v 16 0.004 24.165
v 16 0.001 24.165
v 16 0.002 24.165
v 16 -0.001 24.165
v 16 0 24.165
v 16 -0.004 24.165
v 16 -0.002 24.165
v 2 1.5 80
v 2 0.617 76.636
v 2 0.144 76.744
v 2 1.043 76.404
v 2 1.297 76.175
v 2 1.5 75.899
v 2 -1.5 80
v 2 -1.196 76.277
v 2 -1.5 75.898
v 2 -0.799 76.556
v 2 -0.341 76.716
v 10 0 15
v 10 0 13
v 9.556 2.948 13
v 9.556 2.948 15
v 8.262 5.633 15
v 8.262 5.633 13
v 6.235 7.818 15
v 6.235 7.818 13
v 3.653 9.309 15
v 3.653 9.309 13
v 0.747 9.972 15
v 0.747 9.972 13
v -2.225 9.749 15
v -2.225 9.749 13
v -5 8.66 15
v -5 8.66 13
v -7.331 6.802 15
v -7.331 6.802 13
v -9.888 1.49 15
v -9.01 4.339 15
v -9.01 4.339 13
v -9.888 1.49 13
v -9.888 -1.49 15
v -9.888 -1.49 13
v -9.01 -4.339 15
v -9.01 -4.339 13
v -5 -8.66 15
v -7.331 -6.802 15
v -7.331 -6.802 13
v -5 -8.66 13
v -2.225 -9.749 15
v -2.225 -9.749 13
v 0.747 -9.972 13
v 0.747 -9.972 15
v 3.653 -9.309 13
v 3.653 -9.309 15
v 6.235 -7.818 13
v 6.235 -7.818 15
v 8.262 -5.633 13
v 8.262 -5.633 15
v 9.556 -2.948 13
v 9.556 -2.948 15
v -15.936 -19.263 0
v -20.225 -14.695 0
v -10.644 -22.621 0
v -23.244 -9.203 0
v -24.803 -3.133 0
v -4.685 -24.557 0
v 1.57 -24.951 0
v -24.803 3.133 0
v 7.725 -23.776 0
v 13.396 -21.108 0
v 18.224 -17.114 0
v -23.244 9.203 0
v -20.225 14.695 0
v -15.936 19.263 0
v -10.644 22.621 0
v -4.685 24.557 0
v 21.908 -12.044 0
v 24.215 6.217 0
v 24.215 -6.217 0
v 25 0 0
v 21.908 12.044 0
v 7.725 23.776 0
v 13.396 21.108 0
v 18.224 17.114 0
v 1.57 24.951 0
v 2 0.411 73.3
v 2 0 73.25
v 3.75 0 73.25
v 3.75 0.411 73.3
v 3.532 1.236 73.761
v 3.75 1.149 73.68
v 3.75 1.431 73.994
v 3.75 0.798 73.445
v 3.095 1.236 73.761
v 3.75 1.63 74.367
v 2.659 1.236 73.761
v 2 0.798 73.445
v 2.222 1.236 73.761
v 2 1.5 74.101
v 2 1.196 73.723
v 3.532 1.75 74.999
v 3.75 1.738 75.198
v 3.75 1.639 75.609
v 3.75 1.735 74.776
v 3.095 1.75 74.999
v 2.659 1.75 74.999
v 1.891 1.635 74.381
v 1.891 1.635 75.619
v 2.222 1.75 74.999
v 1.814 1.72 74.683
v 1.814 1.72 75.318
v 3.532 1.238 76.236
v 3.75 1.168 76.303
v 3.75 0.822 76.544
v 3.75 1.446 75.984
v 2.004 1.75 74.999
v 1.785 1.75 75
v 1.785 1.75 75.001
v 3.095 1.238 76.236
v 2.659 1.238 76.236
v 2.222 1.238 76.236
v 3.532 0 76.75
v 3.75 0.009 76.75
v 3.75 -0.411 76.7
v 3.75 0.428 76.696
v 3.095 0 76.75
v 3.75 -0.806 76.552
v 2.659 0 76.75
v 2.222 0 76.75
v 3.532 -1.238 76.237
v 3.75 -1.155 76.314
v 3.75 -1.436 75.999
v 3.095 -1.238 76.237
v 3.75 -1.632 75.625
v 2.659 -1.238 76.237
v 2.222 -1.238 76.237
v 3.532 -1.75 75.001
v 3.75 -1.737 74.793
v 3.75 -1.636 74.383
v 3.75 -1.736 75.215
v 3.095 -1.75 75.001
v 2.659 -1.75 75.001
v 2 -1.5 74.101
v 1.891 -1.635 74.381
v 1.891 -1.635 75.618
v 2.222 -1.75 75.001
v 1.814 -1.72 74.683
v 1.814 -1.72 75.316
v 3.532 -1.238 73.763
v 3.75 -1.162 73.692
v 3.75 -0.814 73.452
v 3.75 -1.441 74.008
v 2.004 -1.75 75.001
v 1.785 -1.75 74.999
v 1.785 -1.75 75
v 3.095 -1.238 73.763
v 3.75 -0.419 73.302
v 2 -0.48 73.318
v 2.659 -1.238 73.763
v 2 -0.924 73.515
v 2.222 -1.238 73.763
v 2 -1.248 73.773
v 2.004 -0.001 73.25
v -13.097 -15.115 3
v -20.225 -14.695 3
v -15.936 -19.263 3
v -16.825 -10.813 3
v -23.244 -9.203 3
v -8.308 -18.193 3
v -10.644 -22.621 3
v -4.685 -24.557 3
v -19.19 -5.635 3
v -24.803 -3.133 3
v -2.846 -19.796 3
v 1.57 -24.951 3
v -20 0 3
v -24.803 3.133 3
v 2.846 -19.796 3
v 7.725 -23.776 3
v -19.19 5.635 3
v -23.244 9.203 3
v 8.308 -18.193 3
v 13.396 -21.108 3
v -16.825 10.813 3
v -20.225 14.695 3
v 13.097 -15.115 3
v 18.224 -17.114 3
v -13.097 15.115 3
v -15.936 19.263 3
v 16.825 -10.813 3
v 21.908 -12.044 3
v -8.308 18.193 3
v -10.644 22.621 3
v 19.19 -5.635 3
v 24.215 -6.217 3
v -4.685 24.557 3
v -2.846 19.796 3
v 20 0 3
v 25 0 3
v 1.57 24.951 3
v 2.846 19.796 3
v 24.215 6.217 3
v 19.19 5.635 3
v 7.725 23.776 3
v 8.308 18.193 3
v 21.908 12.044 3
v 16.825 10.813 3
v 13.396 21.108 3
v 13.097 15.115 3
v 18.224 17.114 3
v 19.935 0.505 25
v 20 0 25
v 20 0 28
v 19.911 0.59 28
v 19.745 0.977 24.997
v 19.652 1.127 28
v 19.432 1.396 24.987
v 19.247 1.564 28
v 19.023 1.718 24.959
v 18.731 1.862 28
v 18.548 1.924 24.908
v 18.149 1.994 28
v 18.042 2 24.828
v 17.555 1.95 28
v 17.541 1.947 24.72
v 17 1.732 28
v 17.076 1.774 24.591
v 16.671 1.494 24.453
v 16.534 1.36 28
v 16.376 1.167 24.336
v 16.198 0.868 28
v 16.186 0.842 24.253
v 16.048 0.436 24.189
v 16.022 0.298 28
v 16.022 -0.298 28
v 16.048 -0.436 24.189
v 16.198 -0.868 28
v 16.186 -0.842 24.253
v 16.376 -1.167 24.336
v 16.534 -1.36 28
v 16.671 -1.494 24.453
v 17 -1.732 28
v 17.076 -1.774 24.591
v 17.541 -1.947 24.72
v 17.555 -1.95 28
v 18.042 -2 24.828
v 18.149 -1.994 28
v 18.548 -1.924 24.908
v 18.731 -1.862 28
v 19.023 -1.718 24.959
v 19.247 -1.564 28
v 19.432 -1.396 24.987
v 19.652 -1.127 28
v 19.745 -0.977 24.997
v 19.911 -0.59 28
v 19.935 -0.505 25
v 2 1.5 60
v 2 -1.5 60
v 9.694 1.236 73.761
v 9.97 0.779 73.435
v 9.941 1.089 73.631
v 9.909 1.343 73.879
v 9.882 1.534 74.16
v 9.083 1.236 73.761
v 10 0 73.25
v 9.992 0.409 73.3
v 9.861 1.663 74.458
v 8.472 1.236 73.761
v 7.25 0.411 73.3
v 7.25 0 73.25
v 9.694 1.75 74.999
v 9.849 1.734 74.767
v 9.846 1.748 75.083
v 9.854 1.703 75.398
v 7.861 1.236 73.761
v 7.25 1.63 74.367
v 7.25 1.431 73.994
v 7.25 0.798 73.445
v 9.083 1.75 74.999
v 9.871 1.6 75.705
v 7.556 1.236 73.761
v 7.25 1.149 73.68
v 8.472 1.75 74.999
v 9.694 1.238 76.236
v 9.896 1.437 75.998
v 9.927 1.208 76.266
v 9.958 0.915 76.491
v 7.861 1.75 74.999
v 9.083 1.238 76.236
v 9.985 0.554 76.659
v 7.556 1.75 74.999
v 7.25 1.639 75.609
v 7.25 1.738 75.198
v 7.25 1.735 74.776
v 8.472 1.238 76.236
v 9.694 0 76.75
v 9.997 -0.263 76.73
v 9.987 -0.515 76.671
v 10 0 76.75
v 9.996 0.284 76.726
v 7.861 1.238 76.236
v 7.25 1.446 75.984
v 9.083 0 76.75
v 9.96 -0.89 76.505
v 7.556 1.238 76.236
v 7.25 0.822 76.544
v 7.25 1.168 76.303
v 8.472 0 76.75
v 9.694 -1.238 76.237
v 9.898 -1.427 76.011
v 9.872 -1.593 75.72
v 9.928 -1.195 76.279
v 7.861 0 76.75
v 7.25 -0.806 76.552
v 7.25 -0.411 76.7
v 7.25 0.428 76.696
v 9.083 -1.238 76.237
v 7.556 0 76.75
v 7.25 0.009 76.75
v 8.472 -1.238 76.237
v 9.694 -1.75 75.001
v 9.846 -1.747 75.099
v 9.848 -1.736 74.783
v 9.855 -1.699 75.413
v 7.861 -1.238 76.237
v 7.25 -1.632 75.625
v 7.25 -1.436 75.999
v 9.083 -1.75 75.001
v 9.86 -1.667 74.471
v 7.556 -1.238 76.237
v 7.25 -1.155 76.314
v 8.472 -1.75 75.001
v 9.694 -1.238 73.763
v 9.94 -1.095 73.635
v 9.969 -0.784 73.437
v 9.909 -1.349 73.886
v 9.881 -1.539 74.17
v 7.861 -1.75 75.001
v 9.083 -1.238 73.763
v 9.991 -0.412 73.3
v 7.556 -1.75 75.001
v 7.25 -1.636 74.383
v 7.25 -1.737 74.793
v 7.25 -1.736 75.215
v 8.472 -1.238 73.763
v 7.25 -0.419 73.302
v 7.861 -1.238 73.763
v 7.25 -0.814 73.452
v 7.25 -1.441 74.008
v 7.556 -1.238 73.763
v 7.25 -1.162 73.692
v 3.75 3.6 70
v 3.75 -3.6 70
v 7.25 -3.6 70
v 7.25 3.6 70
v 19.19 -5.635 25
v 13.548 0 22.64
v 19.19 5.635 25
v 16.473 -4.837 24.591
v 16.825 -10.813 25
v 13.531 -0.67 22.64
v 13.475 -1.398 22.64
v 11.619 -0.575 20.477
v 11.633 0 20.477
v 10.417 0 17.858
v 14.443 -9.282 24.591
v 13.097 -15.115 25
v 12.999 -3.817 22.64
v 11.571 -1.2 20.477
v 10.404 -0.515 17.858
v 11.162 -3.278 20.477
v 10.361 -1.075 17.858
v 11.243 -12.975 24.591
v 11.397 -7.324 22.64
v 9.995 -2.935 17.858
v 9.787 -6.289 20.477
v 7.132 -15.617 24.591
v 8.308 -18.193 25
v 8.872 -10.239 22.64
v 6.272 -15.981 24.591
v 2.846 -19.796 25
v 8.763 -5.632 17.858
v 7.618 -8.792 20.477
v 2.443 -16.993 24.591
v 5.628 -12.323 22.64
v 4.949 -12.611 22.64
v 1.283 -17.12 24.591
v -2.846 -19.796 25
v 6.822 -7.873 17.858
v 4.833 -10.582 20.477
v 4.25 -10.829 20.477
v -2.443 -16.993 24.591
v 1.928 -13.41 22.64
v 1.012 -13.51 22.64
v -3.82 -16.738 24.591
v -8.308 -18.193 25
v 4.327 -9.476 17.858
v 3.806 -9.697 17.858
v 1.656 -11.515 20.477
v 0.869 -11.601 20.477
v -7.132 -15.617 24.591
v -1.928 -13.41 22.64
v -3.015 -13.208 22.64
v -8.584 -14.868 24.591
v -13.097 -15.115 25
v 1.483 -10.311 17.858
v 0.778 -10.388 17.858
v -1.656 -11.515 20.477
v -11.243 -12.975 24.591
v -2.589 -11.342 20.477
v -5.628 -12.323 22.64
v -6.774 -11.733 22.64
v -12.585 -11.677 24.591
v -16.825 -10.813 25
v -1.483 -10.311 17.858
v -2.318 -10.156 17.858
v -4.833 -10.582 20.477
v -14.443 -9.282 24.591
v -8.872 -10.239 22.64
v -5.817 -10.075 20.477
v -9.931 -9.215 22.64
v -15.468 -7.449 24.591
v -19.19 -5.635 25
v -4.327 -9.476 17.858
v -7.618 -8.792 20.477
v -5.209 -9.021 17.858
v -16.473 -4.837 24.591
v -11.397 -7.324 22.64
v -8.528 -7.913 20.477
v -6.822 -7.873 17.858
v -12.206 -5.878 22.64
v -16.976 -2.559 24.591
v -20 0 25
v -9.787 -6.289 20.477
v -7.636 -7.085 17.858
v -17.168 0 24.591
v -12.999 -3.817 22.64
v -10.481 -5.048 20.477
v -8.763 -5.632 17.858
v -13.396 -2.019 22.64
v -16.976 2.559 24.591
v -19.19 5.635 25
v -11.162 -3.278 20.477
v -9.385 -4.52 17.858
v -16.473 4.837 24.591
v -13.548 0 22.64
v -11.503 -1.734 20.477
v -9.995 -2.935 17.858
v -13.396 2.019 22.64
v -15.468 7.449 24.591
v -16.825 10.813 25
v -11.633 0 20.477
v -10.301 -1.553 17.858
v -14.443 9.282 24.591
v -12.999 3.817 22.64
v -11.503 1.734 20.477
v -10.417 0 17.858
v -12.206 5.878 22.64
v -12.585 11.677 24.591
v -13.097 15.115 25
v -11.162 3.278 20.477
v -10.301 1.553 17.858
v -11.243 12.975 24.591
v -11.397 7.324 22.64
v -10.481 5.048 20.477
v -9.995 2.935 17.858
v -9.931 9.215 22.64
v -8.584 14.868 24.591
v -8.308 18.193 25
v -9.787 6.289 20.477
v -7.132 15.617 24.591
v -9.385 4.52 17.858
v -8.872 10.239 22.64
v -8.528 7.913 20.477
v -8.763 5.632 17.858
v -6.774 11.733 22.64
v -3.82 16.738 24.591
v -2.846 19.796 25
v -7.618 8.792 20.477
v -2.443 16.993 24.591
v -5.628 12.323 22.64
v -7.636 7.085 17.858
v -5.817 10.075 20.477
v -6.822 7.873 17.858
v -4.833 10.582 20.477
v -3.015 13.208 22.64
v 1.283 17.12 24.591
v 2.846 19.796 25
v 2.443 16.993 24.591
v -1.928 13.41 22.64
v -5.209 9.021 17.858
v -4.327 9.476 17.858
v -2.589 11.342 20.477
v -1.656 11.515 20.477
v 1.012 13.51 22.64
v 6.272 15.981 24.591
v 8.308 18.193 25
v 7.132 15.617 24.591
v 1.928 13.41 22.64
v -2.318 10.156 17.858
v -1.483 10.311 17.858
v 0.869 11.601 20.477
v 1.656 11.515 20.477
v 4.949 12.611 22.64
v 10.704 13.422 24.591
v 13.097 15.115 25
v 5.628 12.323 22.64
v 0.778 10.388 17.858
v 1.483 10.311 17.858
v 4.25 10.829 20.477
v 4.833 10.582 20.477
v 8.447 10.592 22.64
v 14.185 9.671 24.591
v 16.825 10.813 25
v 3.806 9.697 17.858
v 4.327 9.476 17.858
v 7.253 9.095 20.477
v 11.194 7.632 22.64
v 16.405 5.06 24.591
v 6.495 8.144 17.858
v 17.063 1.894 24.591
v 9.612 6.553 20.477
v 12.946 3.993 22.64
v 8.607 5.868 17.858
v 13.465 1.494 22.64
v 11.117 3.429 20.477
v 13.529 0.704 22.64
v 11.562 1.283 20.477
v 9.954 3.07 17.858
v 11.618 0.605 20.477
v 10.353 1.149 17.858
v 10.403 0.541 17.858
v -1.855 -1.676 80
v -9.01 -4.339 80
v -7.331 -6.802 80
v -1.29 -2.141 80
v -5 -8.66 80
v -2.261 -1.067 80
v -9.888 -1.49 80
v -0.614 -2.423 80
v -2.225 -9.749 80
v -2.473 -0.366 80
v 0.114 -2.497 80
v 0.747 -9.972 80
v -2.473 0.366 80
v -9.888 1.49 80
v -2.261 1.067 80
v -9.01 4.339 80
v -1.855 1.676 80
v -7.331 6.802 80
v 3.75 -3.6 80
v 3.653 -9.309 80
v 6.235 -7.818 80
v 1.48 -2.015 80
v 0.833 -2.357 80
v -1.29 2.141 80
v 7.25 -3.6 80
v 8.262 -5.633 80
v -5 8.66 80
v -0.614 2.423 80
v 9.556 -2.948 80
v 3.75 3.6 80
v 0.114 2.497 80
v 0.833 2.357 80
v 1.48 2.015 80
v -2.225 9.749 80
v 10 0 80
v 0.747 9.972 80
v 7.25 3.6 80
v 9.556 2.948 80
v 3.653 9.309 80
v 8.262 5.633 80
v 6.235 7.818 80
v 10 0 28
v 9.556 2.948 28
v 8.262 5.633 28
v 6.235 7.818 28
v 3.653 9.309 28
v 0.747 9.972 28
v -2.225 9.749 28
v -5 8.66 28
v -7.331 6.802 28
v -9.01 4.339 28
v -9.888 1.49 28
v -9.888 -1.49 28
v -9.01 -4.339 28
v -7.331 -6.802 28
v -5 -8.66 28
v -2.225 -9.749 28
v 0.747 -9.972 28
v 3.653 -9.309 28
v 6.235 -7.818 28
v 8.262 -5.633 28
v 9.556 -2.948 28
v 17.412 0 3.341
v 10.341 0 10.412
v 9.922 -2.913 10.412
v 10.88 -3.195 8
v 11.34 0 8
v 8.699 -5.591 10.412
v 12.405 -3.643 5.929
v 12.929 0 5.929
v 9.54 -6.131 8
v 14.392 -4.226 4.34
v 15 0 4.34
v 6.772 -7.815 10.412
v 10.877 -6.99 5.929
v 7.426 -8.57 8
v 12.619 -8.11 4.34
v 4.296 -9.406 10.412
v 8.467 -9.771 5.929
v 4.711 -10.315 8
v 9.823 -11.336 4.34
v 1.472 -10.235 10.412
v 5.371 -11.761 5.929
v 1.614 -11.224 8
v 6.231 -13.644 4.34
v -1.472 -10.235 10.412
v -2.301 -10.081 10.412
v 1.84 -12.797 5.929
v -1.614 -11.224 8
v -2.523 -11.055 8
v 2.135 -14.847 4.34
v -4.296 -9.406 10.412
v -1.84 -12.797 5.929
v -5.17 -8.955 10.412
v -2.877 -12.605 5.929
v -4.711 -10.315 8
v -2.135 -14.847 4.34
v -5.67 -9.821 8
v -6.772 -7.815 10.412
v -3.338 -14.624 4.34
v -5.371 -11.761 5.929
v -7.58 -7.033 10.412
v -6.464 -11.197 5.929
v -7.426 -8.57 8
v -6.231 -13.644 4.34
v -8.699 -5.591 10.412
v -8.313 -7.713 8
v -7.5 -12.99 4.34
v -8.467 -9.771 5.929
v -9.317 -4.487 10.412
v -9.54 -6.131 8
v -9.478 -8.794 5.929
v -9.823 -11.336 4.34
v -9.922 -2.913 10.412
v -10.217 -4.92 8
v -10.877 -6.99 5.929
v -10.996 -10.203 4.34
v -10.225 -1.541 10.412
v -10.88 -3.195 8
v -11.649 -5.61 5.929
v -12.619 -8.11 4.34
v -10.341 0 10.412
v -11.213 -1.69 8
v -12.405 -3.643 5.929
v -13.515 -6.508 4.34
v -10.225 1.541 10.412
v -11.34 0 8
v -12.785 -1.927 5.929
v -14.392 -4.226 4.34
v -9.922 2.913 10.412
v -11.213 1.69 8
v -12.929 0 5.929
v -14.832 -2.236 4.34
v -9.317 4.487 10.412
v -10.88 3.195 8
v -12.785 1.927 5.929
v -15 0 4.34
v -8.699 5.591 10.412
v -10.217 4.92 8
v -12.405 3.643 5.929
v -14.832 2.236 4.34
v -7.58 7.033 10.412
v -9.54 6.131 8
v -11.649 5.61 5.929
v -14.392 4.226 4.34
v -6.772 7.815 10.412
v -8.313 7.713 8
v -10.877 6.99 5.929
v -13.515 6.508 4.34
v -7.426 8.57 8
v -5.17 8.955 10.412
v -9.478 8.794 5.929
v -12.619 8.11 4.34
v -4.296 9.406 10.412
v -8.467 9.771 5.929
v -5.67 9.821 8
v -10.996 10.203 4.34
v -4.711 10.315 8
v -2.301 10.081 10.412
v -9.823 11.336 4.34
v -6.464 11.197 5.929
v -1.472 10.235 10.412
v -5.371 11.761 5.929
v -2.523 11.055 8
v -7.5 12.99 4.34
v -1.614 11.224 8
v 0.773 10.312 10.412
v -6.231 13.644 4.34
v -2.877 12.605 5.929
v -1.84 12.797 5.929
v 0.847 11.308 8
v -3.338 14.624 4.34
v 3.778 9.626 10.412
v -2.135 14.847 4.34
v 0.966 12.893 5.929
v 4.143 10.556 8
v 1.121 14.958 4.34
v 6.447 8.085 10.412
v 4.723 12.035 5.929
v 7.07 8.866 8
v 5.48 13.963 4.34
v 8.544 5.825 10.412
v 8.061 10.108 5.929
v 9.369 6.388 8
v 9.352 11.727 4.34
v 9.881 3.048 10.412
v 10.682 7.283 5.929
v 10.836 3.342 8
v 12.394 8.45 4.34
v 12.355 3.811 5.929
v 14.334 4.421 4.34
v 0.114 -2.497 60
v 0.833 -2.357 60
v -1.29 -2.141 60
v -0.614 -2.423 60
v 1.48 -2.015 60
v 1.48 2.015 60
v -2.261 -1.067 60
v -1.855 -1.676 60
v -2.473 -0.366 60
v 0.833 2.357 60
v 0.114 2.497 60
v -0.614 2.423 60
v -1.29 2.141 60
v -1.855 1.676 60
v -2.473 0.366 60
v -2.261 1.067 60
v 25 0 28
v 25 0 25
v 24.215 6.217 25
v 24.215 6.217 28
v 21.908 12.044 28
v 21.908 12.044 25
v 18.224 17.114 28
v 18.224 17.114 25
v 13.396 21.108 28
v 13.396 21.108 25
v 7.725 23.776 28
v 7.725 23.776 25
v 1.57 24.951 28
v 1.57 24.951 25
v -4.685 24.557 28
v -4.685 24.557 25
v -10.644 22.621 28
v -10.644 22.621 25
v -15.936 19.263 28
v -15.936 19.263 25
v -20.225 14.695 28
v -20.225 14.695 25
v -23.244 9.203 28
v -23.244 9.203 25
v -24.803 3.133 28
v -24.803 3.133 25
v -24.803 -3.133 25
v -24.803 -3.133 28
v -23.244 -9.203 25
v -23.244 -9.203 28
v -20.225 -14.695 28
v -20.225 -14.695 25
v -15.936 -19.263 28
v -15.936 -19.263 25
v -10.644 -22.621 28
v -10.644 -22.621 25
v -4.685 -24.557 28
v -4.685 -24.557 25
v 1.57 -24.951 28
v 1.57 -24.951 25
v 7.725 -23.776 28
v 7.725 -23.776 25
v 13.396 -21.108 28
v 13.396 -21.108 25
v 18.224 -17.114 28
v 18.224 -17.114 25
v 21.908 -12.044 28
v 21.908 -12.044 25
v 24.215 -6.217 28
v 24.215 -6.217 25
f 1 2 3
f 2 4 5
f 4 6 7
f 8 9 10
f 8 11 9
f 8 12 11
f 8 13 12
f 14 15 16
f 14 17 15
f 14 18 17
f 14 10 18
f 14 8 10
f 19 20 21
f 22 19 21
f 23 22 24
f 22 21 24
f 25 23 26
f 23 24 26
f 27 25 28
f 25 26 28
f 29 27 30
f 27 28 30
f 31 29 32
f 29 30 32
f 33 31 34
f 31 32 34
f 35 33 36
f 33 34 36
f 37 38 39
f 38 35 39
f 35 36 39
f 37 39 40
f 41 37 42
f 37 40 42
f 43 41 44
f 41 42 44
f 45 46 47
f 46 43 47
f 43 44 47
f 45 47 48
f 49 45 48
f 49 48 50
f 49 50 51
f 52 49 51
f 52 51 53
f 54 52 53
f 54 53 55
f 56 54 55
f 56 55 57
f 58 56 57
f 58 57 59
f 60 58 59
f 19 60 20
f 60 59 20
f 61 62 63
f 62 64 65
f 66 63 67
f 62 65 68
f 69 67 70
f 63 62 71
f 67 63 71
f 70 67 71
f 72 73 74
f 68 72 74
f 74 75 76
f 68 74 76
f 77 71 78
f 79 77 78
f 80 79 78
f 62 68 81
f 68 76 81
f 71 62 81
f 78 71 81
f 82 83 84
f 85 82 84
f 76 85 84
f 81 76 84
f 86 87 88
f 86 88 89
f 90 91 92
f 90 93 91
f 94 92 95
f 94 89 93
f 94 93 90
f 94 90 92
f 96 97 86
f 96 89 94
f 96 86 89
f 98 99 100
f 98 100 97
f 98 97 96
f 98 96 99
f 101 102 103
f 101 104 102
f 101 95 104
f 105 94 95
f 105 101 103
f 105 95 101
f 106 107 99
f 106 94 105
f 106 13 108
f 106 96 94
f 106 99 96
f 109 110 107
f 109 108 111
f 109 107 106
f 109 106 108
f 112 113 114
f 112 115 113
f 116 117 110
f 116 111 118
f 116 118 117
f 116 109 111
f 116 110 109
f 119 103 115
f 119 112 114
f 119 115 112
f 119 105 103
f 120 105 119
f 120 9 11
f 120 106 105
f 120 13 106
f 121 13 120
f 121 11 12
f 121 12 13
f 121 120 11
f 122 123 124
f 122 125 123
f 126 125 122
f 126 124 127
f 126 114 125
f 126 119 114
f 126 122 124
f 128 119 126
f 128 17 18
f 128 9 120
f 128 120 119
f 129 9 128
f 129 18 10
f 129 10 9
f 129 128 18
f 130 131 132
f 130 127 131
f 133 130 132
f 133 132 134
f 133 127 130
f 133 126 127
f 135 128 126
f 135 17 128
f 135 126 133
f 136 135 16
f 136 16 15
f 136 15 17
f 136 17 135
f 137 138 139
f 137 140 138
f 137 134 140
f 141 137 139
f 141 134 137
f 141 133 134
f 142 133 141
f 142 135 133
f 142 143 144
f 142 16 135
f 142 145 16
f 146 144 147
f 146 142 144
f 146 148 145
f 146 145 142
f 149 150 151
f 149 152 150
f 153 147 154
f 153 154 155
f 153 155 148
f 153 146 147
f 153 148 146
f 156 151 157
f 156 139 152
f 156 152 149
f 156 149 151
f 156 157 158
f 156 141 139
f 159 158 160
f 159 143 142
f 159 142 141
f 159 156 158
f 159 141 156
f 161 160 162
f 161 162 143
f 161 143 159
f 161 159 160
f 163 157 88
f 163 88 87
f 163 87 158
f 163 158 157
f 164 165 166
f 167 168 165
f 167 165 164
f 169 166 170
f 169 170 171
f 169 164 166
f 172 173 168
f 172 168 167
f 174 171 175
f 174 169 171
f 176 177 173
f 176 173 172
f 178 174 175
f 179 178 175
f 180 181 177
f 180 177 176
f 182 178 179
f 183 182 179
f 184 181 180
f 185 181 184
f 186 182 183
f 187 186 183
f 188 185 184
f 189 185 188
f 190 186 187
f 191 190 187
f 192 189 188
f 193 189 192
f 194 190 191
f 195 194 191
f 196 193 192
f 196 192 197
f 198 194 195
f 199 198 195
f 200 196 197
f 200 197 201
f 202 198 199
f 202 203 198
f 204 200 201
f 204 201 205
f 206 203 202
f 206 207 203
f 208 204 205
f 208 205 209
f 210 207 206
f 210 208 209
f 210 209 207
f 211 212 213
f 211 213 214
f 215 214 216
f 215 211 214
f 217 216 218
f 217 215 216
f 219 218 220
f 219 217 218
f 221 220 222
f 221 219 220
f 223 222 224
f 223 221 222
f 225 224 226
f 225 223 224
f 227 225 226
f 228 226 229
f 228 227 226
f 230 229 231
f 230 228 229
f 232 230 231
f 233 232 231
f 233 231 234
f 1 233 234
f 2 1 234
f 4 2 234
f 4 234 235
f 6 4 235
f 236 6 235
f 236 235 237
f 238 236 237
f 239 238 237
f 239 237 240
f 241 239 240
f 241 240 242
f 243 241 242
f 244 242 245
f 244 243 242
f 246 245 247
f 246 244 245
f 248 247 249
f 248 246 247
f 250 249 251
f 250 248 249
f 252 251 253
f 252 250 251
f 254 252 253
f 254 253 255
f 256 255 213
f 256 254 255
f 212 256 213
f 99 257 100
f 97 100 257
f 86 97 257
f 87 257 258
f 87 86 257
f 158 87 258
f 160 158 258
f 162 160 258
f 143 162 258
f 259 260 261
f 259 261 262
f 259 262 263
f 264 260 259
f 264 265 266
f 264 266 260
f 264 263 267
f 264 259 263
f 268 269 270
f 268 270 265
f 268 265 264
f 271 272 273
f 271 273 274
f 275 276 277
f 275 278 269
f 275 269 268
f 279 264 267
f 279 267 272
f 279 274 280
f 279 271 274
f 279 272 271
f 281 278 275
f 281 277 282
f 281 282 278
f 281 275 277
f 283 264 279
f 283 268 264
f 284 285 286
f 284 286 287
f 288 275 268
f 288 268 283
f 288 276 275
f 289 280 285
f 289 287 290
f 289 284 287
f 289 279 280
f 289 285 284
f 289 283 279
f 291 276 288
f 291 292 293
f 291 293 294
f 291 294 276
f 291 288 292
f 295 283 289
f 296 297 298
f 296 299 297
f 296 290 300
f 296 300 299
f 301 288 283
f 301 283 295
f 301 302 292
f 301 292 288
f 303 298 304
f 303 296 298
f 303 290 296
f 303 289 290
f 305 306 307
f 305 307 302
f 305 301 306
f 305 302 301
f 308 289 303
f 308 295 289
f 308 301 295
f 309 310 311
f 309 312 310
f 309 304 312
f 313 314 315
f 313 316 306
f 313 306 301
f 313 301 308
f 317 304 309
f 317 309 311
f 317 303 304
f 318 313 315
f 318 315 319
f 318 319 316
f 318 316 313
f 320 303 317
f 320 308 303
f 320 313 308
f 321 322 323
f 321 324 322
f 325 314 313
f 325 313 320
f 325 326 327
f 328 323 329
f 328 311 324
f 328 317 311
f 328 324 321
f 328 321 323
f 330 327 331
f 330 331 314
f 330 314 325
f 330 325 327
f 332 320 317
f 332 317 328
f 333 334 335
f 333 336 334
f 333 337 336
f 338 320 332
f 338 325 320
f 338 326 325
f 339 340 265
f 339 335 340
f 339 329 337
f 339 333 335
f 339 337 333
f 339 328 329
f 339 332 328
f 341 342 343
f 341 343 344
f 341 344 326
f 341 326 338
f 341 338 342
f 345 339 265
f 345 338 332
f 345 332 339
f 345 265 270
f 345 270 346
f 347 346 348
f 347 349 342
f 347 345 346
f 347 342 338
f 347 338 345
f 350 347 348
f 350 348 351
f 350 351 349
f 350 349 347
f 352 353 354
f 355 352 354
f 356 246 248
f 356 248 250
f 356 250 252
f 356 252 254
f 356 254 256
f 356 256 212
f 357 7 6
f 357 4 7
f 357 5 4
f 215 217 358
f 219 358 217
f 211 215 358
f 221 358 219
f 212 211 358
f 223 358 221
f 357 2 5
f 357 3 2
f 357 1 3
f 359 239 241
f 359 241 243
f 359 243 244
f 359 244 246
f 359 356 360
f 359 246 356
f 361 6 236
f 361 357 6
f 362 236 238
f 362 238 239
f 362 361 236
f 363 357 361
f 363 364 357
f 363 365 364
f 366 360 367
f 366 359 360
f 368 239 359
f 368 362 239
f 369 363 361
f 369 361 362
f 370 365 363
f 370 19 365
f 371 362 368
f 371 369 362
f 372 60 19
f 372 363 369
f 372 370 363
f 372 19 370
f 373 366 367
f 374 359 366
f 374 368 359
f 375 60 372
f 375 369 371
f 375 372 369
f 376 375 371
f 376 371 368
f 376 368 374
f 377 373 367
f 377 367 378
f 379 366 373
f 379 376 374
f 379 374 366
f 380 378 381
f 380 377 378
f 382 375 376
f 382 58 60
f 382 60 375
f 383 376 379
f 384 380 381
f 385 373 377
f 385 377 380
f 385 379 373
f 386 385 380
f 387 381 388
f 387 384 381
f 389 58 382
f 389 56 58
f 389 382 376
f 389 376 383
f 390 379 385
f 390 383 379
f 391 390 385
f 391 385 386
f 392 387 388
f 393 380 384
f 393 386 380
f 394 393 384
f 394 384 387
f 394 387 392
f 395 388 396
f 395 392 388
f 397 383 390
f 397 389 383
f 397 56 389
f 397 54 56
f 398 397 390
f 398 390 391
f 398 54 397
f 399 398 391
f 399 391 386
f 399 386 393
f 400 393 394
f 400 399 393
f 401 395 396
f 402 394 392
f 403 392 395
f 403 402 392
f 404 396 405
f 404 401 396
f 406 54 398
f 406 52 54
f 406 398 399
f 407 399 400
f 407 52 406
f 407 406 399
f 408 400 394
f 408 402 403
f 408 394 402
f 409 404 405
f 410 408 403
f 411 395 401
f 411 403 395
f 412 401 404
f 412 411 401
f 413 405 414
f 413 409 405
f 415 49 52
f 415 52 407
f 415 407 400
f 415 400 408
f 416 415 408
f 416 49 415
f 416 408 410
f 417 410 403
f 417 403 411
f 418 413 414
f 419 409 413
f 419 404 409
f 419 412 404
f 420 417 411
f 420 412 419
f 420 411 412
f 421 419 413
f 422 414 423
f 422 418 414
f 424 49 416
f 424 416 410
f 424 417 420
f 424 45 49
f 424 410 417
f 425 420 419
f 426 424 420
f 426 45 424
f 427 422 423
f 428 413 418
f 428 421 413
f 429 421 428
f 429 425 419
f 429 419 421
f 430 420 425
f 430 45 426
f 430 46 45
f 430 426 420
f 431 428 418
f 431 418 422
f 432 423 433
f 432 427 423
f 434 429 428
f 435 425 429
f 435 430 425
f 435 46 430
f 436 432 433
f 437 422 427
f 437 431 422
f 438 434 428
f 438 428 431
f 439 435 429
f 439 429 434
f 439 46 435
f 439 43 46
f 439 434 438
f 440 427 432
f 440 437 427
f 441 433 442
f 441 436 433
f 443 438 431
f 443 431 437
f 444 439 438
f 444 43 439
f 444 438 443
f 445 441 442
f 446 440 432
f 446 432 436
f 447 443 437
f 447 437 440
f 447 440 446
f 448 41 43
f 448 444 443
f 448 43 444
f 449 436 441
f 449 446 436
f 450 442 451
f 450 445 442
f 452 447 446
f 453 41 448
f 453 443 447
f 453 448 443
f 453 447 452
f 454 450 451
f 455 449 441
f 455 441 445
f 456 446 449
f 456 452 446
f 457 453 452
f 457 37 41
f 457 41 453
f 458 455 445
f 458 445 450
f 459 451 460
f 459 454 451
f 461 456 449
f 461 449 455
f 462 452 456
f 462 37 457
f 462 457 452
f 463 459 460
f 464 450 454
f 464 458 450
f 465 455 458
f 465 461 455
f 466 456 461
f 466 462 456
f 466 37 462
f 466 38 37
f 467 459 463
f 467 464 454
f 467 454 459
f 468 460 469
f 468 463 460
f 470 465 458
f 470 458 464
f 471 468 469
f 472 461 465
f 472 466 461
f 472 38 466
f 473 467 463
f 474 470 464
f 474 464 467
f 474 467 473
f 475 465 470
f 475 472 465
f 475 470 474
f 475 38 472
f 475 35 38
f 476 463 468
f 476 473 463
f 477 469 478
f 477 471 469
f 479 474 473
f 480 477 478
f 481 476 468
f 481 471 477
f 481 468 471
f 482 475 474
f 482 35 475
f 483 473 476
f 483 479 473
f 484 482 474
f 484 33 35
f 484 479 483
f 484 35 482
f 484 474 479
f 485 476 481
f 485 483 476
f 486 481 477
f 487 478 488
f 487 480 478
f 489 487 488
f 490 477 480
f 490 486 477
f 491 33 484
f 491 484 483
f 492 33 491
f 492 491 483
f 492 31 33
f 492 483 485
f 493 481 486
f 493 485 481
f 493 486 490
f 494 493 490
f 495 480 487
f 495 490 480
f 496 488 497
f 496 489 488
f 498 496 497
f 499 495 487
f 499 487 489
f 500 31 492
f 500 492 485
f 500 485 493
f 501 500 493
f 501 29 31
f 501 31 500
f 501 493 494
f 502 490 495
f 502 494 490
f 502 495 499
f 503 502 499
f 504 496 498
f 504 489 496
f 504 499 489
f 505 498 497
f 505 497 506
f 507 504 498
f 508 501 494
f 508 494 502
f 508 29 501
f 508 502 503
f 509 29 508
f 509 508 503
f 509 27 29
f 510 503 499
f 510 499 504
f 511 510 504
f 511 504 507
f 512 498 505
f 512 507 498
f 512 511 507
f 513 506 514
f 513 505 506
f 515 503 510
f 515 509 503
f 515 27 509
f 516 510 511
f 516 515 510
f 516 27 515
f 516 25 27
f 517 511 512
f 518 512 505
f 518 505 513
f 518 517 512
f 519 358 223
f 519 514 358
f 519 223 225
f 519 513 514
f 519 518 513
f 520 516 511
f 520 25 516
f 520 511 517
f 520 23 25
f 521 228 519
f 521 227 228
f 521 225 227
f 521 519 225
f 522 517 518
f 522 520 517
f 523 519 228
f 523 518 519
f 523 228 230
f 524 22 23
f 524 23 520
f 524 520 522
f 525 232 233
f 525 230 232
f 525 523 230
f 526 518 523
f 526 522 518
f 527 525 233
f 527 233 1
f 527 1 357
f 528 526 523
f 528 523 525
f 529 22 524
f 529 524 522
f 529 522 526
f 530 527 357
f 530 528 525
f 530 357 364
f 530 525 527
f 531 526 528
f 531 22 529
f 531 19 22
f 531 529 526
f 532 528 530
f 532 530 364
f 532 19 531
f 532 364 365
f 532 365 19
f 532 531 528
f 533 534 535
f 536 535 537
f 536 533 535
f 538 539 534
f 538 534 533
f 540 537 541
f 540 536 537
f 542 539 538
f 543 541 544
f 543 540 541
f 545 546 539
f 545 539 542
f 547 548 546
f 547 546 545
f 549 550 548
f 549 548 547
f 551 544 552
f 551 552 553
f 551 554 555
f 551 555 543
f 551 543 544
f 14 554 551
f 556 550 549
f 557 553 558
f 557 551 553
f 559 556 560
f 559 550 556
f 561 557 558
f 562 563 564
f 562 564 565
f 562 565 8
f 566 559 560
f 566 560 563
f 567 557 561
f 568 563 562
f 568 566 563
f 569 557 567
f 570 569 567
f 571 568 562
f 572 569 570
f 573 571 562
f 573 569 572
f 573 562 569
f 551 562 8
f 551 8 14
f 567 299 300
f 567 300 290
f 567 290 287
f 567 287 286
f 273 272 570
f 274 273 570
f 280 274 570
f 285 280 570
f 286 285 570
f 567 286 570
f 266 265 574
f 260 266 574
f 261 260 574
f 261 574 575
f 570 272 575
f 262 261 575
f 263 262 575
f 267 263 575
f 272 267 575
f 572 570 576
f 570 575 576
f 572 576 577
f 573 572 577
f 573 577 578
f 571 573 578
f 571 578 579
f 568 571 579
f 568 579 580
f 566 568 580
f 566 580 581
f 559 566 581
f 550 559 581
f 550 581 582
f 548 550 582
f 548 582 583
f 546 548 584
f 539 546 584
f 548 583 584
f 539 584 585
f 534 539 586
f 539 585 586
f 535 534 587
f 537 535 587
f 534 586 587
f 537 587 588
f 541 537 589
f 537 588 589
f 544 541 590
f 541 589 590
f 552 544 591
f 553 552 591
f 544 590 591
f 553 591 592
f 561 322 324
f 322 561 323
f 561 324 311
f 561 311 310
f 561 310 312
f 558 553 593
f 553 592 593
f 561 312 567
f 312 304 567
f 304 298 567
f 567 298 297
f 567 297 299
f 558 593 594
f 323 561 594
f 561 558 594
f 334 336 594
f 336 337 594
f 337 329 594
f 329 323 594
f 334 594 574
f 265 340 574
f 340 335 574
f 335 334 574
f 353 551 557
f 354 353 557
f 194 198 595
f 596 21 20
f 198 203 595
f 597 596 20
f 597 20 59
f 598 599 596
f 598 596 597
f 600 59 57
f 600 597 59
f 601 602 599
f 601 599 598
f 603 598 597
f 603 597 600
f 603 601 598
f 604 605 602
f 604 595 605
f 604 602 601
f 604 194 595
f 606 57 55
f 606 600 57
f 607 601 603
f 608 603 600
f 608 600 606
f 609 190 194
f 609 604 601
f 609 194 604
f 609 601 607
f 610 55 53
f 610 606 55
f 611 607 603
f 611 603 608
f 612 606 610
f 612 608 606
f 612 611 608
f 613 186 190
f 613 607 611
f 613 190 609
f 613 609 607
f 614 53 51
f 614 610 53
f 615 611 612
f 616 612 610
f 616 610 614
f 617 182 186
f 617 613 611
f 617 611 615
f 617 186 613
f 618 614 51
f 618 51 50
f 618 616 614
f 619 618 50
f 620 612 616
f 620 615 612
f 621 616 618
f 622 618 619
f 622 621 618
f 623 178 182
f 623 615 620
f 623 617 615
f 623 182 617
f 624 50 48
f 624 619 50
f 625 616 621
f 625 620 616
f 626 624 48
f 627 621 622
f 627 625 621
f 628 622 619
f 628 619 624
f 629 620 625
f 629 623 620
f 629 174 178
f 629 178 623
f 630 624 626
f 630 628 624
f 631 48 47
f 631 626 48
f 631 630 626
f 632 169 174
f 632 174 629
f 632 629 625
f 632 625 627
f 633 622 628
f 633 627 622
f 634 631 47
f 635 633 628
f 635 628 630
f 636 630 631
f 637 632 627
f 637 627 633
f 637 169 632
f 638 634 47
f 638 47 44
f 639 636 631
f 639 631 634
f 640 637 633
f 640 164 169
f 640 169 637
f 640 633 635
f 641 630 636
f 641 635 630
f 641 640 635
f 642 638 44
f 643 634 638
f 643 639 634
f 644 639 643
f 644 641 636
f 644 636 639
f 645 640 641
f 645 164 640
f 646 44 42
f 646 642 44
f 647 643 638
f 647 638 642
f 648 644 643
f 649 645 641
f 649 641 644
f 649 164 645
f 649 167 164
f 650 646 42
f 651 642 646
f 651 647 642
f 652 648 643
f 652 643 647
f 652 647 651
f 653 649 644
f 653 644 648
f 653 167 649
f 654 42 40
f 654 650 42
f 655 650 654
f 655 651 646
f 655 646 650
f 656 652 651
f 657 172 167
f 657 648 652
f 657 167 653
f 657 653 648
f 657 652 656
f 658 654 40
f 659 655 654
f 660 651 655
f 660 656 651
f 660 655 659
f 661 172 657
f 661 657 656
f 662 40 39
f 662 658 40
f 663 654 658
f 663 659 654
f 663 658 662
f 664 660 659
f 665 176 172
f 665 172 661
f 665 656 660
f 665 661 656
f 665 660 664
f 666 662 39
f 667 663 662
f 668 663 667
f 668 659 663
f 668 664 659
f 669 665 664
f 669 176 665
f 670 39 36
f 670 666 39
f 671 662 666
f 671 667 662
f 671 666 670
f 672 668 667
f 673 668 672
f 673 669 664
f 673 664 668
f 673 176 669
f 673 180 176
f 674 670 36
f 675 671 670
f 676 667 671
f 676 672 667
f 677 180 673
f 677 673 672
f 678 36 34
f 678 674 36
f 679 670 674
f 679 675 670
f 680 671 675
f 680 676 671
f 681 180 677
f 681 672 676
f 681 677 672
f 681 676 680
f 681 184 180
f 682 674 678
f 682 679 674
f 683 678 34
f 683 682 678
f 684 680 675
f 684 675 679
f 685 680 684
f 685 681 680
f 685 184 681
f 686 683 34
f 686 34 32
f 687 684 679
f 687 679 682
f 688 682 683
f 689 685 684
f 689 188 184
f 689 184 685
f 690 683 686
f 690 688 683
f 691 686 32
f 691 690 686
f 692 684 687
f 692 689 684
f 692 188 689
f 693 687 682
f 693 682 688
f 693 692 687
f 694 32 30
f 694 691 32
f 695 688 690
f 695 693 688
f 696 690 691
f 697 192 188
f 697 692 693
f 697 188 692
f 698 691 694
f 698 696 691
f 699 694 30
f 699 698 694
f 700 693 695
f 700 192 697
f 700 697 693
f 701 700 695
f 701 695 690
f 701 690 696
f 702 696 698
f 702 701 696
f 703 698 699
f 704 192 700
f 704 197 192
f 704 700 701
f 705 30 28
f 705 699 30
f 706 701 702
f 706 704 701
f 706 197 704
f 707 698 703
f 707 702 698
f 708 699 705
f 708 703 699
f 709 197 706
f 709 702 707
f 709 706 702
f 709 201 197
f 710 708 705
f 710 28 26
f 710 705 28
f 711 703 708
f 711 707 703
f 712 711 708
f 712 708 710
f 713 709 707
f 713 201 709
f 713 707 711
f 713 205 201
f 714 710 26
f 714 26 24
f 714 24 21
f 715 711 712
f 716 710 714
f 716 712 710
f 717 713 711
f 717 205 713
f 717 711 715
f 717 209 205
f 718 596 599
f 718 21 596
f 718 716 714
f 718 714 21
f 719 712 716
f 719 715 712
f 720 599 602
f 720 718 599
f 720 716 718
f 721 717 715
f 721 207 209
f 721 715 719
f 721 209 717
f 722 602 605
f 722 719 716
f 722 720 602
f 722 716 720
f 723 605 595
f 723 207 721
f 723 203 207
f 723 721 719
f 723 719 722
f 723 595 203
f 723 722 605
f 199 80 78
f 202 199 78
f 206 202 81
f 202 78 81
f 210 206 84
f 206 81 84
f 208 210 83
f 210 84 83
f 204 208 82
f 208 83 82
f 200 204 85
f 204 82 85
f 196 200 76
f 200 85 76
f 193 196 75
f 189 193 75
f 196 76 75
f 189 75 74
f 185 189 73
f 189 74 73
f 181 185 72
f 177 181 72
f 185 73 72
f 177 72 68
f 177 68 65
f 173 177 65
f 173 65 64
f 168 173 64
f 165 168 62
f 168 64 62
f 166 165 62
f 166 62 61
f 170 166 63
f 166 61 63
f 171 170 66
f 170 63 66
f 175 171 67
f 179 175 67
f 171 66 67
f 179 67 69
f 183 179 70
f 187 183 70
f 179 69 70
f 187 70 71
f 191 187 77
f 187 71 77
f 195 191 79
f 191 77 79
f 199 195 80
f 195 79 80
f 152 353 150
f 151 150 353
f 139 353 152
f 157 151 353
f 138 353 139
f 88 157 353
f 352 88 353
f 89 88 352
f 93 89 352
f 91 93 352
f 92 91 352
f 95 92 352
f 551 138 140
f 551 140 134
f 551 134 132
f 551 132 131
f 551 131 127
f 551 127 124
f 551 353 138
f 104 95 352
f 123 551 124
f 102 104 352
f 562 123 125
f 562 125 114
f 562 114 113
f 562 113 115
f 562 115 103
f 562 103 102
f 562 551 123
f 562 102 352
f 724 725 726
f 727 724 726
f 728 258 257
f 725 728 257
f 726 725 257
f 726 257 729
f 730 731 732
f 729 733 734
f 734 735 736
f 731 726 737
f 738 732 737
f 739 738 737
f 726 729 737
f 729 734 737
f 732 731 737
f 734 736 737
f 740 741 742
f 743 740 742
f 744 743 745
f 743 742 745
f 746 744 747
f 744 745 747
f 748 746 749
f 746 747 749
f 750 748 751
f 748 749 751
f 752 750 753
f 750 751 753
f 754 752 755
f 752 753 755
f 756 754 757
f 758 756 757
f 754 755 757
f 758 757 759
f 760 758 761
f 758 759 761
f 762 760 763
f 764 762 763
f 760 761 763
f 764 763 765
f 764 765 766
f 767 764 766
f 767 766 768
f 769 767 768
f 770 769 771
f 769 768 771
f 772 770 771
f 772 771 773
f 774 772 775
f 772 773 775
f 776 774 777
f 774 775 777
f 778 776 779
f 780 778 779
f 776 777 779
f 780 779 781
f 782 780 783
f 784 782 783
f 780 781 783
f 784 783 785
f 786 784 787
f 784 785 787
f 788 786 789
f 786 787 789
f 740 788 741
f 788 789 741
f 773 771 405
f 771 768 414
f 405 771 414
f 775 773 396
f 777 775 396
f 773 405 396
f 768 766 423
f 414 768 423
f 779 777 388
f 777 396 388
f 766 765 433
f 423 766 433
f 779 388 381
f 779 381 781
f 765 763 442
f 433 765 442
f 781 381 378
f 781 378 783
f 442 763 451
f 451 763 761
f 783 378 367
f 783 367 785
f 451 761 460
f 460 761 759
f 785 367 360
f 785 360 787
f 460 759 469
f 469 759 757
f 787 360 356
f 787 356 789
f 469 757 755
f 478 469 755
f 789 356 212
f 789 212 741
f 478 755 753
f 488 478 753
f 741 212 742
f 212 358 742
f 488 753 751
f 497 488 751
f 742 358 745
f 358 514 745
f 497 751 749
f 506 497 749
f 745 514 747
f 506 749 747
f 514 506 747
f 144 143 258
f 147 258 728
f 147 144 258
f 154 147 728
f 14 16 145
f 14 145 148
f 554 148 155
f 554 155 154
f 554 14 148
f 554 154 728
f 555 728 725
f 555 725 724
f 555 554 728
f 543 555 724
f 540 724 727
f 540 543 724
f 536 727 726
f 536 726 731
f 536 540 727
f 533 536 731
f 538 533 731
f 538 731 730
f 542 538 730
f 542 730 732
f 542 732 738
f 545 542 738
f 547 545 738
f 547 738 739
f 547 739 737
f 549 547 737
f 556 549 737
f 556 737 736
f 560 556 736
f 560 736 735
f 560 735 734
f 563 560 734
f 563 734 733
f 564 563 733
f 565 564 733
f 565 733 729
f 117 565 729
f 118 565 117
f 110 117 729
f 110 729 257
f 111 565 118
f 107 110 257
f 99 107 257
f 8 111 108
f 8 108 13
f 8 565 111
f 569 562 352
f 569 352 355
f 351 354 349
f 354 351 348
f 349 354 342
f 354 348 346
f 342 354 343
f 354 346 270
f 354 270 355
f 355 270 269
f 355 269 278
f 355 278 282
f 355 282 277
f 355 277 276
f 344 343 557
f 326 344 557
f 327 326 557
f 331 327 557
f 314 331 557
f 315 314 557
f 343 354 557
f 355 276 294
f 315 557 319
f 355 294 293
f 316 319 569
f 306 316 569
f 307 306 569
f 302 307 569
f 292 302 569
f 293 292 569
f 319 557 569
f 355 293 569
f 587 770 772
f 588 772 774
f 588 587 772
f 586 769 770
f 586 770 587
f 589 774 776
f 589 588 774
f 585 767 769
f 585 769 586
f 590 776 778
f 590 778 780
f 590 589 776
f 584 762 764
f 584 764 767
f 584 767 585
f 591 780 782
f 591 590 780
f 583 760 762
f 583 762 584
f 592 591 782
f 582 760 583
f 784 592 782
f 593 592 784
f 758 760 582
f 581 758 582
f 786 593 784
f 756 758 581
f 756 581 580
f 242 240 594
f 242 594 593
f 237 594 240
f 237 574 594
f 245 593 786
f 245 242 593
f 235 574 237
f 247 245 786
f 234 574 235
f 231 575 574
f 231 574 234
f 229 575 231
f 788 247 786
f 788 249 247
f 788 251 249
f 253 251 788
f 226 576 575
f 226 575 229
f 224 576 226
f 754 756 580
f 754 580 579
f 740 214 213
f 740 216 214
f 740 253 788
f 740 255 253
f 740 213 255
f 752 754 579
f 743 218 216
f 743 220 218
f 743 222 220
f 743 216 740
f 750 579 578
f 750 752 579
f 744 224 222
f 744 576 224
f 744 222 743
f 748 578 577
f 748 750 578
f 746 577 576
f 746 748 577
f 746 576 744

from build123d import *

# Parameters (mm, degrees)
CROQUIS1_R              = 10
SALIENTE_EXTRUIR2_DEPTH = 80
CROQUIS4_R              = 25
SALIENTE_EXTRUIR3_DEPTH = 3
SALIENTE_EXTRUIR4_START = 25
CROQUIS5_R              = 25
SALIENTE_EXTRUIR4_DEPTH = 3
REDONDEO2_R             = 10
CORTAR_EXTRUIR1_START   = 80
CORTAR_EXTRUIR1_DEPTH   = 20
CORTAR_EXTRUIR2_START   = 80
CROQUIS7_W              = 3.5
CROQUIS7_H              = 7.2
CORTAR_EXTRUIR2_DEPTH   = 10
CORTAR_EXTRUIR3_START   = 1.785357468
CORTAR_EXTRUIR3_DEPTH   = 8.214642632
CORTAR_EXTRUIR4_START   = 24.165153
CROQUIS9_R              = 2
CORTAR_EXTRUIR4_DEPTH   = 3.834847


# Read off the part's stored shape, not the designer's step: Cortar-Extruir3
with BuildPart() as part:
    # Croquis1 → Saliente-Extruir2 (new body)
    with BuildSketch(Plane.XY):
        Circle(CROQUIS1_R)
    extrude(amount=SALIENTE_EXTRUIR2_DEPTH)

    # Croquis4 → Saliente-Extruir3 (add)
    with BuildSketch(Plane.XY):
        Circle(CROQUIS4_R)
    extrude(amount=SALIENTE_EXTRUIR3_DEPTH)

    # Croquis5 → Saliente-Extruir4 (add)
    with BuildSketch(Plane.XY.offset(SALIENTE_EXTRUIR4_START)):
        Circle(CROQUIS5_R)
    extrude(amount=SALIENTE_EXTRUIR4_DEPTH)

    # Redondeo2
    redondeo2_edges = [part.edges().sort_by_distance(p)[0] for p in [
        (-10, 0, 25),
        (-10, 0, 3),
    ]]
    fillet(redondeo2_edges, radius=REDONDEO2_R)

    # Croquis6 → Cortar-Extruir1 (cut)
    with BuildSketch(Plane.XY.offset(CORTAR_EXTRUIR1_START)):
        with BuildLine():
            Line((2, 1.5), (2, -1.5))
            ThreePointArc((2, -1.5), (-2.5, 0), (2, 1.5))
        make_face()
    extrude(amount=-CORTAR_EXTRUIR1_DEPTH, mode=Mode.SUBTRACT)

    # Croquis7 → Cortar-Extruir2 (cut)
    with BuildSketch(Plane.XY.offset(CORTAR_EXTRUIR2_START)):
        with Locations((5.5, 0)):
            Rectangle(CROQUIS7_W, CROQUIS7_H)
    extrude(amount=-CORTAR_EXTRUIR2_DEPTH, mode=Mode.SUBTRACT)

    # Cortar-Extruir3 outline → Cortar-Extruir3 (cut)
    with BuildSketch(Plane(origin=(0, 0, 0), x_dir=(0, 0, -1), z_dir=(1, 0, 0)).offset(CORTAR_EXTRUIR3_START)):
        with BuildLine():
            add(Edge.make_bspline(
                [(-73.250000008, 0), (-73.250010298, 0.457042806), (-73.439269311, 0.913556657), (-73.761440573, 1.236313288), (-74.083774062, 1.559232356), (-74.536167707, 1.749638189), (-74.998632957, 1.749999466), (-75.46109828, 1.75036072), (-75.914256207, 1.560125437), (-76.558728463, 0.916635921), (-76.75, 0.463408547), (-76.75, -0.463408547), (-76.559497121, -0.915462775), (-75.915045576, -1.559741953), (-75.458501248, -1.749734355), (-74.543528816, -1.750265056), (-74.088756627, -1.563446648), (-73.437067231, -0.912124478), (-73.250180582, -0.457964068), (-73.250000045, -0.000460382), (-73.250000003, -0.000230191), (-73.250000008, 0)],
                knots=[0.500062925, 0.500062925, 0.500062925, 0.500062925, 0.625, 0.625, 0.625000034, 0.750000005, 0.750000005, 0.750000019, 0.875000002, 0.875000002, 0.999999997, 0.999999997, 1.124999993, 1.124999993, 1.24999999, 1.24999999, 1.374999987, 1.374999987, 1.499999981, 1.499999981, 1.500062906, 1.500062906, 1.500062906, 1.500062906], degree=3))
        make_face()
    extrude(amount=CORTAR_EXTRUIR3_DEPTH, mode=Mode.SUBTRACT)

    # Croquis9 → Cortar-Extruir4 (cut)
    with BuildSketch(Plane.XY.offset(CORTAR_EXTRUIR4_START)):
        with Locations((18, 0)):
            Circle(CROQUIS9_R)
    extrude(amount=CORTAR_EXTRUIR4_DEPTH, mode=Mode.SUBTRACT)


solid = part.part
